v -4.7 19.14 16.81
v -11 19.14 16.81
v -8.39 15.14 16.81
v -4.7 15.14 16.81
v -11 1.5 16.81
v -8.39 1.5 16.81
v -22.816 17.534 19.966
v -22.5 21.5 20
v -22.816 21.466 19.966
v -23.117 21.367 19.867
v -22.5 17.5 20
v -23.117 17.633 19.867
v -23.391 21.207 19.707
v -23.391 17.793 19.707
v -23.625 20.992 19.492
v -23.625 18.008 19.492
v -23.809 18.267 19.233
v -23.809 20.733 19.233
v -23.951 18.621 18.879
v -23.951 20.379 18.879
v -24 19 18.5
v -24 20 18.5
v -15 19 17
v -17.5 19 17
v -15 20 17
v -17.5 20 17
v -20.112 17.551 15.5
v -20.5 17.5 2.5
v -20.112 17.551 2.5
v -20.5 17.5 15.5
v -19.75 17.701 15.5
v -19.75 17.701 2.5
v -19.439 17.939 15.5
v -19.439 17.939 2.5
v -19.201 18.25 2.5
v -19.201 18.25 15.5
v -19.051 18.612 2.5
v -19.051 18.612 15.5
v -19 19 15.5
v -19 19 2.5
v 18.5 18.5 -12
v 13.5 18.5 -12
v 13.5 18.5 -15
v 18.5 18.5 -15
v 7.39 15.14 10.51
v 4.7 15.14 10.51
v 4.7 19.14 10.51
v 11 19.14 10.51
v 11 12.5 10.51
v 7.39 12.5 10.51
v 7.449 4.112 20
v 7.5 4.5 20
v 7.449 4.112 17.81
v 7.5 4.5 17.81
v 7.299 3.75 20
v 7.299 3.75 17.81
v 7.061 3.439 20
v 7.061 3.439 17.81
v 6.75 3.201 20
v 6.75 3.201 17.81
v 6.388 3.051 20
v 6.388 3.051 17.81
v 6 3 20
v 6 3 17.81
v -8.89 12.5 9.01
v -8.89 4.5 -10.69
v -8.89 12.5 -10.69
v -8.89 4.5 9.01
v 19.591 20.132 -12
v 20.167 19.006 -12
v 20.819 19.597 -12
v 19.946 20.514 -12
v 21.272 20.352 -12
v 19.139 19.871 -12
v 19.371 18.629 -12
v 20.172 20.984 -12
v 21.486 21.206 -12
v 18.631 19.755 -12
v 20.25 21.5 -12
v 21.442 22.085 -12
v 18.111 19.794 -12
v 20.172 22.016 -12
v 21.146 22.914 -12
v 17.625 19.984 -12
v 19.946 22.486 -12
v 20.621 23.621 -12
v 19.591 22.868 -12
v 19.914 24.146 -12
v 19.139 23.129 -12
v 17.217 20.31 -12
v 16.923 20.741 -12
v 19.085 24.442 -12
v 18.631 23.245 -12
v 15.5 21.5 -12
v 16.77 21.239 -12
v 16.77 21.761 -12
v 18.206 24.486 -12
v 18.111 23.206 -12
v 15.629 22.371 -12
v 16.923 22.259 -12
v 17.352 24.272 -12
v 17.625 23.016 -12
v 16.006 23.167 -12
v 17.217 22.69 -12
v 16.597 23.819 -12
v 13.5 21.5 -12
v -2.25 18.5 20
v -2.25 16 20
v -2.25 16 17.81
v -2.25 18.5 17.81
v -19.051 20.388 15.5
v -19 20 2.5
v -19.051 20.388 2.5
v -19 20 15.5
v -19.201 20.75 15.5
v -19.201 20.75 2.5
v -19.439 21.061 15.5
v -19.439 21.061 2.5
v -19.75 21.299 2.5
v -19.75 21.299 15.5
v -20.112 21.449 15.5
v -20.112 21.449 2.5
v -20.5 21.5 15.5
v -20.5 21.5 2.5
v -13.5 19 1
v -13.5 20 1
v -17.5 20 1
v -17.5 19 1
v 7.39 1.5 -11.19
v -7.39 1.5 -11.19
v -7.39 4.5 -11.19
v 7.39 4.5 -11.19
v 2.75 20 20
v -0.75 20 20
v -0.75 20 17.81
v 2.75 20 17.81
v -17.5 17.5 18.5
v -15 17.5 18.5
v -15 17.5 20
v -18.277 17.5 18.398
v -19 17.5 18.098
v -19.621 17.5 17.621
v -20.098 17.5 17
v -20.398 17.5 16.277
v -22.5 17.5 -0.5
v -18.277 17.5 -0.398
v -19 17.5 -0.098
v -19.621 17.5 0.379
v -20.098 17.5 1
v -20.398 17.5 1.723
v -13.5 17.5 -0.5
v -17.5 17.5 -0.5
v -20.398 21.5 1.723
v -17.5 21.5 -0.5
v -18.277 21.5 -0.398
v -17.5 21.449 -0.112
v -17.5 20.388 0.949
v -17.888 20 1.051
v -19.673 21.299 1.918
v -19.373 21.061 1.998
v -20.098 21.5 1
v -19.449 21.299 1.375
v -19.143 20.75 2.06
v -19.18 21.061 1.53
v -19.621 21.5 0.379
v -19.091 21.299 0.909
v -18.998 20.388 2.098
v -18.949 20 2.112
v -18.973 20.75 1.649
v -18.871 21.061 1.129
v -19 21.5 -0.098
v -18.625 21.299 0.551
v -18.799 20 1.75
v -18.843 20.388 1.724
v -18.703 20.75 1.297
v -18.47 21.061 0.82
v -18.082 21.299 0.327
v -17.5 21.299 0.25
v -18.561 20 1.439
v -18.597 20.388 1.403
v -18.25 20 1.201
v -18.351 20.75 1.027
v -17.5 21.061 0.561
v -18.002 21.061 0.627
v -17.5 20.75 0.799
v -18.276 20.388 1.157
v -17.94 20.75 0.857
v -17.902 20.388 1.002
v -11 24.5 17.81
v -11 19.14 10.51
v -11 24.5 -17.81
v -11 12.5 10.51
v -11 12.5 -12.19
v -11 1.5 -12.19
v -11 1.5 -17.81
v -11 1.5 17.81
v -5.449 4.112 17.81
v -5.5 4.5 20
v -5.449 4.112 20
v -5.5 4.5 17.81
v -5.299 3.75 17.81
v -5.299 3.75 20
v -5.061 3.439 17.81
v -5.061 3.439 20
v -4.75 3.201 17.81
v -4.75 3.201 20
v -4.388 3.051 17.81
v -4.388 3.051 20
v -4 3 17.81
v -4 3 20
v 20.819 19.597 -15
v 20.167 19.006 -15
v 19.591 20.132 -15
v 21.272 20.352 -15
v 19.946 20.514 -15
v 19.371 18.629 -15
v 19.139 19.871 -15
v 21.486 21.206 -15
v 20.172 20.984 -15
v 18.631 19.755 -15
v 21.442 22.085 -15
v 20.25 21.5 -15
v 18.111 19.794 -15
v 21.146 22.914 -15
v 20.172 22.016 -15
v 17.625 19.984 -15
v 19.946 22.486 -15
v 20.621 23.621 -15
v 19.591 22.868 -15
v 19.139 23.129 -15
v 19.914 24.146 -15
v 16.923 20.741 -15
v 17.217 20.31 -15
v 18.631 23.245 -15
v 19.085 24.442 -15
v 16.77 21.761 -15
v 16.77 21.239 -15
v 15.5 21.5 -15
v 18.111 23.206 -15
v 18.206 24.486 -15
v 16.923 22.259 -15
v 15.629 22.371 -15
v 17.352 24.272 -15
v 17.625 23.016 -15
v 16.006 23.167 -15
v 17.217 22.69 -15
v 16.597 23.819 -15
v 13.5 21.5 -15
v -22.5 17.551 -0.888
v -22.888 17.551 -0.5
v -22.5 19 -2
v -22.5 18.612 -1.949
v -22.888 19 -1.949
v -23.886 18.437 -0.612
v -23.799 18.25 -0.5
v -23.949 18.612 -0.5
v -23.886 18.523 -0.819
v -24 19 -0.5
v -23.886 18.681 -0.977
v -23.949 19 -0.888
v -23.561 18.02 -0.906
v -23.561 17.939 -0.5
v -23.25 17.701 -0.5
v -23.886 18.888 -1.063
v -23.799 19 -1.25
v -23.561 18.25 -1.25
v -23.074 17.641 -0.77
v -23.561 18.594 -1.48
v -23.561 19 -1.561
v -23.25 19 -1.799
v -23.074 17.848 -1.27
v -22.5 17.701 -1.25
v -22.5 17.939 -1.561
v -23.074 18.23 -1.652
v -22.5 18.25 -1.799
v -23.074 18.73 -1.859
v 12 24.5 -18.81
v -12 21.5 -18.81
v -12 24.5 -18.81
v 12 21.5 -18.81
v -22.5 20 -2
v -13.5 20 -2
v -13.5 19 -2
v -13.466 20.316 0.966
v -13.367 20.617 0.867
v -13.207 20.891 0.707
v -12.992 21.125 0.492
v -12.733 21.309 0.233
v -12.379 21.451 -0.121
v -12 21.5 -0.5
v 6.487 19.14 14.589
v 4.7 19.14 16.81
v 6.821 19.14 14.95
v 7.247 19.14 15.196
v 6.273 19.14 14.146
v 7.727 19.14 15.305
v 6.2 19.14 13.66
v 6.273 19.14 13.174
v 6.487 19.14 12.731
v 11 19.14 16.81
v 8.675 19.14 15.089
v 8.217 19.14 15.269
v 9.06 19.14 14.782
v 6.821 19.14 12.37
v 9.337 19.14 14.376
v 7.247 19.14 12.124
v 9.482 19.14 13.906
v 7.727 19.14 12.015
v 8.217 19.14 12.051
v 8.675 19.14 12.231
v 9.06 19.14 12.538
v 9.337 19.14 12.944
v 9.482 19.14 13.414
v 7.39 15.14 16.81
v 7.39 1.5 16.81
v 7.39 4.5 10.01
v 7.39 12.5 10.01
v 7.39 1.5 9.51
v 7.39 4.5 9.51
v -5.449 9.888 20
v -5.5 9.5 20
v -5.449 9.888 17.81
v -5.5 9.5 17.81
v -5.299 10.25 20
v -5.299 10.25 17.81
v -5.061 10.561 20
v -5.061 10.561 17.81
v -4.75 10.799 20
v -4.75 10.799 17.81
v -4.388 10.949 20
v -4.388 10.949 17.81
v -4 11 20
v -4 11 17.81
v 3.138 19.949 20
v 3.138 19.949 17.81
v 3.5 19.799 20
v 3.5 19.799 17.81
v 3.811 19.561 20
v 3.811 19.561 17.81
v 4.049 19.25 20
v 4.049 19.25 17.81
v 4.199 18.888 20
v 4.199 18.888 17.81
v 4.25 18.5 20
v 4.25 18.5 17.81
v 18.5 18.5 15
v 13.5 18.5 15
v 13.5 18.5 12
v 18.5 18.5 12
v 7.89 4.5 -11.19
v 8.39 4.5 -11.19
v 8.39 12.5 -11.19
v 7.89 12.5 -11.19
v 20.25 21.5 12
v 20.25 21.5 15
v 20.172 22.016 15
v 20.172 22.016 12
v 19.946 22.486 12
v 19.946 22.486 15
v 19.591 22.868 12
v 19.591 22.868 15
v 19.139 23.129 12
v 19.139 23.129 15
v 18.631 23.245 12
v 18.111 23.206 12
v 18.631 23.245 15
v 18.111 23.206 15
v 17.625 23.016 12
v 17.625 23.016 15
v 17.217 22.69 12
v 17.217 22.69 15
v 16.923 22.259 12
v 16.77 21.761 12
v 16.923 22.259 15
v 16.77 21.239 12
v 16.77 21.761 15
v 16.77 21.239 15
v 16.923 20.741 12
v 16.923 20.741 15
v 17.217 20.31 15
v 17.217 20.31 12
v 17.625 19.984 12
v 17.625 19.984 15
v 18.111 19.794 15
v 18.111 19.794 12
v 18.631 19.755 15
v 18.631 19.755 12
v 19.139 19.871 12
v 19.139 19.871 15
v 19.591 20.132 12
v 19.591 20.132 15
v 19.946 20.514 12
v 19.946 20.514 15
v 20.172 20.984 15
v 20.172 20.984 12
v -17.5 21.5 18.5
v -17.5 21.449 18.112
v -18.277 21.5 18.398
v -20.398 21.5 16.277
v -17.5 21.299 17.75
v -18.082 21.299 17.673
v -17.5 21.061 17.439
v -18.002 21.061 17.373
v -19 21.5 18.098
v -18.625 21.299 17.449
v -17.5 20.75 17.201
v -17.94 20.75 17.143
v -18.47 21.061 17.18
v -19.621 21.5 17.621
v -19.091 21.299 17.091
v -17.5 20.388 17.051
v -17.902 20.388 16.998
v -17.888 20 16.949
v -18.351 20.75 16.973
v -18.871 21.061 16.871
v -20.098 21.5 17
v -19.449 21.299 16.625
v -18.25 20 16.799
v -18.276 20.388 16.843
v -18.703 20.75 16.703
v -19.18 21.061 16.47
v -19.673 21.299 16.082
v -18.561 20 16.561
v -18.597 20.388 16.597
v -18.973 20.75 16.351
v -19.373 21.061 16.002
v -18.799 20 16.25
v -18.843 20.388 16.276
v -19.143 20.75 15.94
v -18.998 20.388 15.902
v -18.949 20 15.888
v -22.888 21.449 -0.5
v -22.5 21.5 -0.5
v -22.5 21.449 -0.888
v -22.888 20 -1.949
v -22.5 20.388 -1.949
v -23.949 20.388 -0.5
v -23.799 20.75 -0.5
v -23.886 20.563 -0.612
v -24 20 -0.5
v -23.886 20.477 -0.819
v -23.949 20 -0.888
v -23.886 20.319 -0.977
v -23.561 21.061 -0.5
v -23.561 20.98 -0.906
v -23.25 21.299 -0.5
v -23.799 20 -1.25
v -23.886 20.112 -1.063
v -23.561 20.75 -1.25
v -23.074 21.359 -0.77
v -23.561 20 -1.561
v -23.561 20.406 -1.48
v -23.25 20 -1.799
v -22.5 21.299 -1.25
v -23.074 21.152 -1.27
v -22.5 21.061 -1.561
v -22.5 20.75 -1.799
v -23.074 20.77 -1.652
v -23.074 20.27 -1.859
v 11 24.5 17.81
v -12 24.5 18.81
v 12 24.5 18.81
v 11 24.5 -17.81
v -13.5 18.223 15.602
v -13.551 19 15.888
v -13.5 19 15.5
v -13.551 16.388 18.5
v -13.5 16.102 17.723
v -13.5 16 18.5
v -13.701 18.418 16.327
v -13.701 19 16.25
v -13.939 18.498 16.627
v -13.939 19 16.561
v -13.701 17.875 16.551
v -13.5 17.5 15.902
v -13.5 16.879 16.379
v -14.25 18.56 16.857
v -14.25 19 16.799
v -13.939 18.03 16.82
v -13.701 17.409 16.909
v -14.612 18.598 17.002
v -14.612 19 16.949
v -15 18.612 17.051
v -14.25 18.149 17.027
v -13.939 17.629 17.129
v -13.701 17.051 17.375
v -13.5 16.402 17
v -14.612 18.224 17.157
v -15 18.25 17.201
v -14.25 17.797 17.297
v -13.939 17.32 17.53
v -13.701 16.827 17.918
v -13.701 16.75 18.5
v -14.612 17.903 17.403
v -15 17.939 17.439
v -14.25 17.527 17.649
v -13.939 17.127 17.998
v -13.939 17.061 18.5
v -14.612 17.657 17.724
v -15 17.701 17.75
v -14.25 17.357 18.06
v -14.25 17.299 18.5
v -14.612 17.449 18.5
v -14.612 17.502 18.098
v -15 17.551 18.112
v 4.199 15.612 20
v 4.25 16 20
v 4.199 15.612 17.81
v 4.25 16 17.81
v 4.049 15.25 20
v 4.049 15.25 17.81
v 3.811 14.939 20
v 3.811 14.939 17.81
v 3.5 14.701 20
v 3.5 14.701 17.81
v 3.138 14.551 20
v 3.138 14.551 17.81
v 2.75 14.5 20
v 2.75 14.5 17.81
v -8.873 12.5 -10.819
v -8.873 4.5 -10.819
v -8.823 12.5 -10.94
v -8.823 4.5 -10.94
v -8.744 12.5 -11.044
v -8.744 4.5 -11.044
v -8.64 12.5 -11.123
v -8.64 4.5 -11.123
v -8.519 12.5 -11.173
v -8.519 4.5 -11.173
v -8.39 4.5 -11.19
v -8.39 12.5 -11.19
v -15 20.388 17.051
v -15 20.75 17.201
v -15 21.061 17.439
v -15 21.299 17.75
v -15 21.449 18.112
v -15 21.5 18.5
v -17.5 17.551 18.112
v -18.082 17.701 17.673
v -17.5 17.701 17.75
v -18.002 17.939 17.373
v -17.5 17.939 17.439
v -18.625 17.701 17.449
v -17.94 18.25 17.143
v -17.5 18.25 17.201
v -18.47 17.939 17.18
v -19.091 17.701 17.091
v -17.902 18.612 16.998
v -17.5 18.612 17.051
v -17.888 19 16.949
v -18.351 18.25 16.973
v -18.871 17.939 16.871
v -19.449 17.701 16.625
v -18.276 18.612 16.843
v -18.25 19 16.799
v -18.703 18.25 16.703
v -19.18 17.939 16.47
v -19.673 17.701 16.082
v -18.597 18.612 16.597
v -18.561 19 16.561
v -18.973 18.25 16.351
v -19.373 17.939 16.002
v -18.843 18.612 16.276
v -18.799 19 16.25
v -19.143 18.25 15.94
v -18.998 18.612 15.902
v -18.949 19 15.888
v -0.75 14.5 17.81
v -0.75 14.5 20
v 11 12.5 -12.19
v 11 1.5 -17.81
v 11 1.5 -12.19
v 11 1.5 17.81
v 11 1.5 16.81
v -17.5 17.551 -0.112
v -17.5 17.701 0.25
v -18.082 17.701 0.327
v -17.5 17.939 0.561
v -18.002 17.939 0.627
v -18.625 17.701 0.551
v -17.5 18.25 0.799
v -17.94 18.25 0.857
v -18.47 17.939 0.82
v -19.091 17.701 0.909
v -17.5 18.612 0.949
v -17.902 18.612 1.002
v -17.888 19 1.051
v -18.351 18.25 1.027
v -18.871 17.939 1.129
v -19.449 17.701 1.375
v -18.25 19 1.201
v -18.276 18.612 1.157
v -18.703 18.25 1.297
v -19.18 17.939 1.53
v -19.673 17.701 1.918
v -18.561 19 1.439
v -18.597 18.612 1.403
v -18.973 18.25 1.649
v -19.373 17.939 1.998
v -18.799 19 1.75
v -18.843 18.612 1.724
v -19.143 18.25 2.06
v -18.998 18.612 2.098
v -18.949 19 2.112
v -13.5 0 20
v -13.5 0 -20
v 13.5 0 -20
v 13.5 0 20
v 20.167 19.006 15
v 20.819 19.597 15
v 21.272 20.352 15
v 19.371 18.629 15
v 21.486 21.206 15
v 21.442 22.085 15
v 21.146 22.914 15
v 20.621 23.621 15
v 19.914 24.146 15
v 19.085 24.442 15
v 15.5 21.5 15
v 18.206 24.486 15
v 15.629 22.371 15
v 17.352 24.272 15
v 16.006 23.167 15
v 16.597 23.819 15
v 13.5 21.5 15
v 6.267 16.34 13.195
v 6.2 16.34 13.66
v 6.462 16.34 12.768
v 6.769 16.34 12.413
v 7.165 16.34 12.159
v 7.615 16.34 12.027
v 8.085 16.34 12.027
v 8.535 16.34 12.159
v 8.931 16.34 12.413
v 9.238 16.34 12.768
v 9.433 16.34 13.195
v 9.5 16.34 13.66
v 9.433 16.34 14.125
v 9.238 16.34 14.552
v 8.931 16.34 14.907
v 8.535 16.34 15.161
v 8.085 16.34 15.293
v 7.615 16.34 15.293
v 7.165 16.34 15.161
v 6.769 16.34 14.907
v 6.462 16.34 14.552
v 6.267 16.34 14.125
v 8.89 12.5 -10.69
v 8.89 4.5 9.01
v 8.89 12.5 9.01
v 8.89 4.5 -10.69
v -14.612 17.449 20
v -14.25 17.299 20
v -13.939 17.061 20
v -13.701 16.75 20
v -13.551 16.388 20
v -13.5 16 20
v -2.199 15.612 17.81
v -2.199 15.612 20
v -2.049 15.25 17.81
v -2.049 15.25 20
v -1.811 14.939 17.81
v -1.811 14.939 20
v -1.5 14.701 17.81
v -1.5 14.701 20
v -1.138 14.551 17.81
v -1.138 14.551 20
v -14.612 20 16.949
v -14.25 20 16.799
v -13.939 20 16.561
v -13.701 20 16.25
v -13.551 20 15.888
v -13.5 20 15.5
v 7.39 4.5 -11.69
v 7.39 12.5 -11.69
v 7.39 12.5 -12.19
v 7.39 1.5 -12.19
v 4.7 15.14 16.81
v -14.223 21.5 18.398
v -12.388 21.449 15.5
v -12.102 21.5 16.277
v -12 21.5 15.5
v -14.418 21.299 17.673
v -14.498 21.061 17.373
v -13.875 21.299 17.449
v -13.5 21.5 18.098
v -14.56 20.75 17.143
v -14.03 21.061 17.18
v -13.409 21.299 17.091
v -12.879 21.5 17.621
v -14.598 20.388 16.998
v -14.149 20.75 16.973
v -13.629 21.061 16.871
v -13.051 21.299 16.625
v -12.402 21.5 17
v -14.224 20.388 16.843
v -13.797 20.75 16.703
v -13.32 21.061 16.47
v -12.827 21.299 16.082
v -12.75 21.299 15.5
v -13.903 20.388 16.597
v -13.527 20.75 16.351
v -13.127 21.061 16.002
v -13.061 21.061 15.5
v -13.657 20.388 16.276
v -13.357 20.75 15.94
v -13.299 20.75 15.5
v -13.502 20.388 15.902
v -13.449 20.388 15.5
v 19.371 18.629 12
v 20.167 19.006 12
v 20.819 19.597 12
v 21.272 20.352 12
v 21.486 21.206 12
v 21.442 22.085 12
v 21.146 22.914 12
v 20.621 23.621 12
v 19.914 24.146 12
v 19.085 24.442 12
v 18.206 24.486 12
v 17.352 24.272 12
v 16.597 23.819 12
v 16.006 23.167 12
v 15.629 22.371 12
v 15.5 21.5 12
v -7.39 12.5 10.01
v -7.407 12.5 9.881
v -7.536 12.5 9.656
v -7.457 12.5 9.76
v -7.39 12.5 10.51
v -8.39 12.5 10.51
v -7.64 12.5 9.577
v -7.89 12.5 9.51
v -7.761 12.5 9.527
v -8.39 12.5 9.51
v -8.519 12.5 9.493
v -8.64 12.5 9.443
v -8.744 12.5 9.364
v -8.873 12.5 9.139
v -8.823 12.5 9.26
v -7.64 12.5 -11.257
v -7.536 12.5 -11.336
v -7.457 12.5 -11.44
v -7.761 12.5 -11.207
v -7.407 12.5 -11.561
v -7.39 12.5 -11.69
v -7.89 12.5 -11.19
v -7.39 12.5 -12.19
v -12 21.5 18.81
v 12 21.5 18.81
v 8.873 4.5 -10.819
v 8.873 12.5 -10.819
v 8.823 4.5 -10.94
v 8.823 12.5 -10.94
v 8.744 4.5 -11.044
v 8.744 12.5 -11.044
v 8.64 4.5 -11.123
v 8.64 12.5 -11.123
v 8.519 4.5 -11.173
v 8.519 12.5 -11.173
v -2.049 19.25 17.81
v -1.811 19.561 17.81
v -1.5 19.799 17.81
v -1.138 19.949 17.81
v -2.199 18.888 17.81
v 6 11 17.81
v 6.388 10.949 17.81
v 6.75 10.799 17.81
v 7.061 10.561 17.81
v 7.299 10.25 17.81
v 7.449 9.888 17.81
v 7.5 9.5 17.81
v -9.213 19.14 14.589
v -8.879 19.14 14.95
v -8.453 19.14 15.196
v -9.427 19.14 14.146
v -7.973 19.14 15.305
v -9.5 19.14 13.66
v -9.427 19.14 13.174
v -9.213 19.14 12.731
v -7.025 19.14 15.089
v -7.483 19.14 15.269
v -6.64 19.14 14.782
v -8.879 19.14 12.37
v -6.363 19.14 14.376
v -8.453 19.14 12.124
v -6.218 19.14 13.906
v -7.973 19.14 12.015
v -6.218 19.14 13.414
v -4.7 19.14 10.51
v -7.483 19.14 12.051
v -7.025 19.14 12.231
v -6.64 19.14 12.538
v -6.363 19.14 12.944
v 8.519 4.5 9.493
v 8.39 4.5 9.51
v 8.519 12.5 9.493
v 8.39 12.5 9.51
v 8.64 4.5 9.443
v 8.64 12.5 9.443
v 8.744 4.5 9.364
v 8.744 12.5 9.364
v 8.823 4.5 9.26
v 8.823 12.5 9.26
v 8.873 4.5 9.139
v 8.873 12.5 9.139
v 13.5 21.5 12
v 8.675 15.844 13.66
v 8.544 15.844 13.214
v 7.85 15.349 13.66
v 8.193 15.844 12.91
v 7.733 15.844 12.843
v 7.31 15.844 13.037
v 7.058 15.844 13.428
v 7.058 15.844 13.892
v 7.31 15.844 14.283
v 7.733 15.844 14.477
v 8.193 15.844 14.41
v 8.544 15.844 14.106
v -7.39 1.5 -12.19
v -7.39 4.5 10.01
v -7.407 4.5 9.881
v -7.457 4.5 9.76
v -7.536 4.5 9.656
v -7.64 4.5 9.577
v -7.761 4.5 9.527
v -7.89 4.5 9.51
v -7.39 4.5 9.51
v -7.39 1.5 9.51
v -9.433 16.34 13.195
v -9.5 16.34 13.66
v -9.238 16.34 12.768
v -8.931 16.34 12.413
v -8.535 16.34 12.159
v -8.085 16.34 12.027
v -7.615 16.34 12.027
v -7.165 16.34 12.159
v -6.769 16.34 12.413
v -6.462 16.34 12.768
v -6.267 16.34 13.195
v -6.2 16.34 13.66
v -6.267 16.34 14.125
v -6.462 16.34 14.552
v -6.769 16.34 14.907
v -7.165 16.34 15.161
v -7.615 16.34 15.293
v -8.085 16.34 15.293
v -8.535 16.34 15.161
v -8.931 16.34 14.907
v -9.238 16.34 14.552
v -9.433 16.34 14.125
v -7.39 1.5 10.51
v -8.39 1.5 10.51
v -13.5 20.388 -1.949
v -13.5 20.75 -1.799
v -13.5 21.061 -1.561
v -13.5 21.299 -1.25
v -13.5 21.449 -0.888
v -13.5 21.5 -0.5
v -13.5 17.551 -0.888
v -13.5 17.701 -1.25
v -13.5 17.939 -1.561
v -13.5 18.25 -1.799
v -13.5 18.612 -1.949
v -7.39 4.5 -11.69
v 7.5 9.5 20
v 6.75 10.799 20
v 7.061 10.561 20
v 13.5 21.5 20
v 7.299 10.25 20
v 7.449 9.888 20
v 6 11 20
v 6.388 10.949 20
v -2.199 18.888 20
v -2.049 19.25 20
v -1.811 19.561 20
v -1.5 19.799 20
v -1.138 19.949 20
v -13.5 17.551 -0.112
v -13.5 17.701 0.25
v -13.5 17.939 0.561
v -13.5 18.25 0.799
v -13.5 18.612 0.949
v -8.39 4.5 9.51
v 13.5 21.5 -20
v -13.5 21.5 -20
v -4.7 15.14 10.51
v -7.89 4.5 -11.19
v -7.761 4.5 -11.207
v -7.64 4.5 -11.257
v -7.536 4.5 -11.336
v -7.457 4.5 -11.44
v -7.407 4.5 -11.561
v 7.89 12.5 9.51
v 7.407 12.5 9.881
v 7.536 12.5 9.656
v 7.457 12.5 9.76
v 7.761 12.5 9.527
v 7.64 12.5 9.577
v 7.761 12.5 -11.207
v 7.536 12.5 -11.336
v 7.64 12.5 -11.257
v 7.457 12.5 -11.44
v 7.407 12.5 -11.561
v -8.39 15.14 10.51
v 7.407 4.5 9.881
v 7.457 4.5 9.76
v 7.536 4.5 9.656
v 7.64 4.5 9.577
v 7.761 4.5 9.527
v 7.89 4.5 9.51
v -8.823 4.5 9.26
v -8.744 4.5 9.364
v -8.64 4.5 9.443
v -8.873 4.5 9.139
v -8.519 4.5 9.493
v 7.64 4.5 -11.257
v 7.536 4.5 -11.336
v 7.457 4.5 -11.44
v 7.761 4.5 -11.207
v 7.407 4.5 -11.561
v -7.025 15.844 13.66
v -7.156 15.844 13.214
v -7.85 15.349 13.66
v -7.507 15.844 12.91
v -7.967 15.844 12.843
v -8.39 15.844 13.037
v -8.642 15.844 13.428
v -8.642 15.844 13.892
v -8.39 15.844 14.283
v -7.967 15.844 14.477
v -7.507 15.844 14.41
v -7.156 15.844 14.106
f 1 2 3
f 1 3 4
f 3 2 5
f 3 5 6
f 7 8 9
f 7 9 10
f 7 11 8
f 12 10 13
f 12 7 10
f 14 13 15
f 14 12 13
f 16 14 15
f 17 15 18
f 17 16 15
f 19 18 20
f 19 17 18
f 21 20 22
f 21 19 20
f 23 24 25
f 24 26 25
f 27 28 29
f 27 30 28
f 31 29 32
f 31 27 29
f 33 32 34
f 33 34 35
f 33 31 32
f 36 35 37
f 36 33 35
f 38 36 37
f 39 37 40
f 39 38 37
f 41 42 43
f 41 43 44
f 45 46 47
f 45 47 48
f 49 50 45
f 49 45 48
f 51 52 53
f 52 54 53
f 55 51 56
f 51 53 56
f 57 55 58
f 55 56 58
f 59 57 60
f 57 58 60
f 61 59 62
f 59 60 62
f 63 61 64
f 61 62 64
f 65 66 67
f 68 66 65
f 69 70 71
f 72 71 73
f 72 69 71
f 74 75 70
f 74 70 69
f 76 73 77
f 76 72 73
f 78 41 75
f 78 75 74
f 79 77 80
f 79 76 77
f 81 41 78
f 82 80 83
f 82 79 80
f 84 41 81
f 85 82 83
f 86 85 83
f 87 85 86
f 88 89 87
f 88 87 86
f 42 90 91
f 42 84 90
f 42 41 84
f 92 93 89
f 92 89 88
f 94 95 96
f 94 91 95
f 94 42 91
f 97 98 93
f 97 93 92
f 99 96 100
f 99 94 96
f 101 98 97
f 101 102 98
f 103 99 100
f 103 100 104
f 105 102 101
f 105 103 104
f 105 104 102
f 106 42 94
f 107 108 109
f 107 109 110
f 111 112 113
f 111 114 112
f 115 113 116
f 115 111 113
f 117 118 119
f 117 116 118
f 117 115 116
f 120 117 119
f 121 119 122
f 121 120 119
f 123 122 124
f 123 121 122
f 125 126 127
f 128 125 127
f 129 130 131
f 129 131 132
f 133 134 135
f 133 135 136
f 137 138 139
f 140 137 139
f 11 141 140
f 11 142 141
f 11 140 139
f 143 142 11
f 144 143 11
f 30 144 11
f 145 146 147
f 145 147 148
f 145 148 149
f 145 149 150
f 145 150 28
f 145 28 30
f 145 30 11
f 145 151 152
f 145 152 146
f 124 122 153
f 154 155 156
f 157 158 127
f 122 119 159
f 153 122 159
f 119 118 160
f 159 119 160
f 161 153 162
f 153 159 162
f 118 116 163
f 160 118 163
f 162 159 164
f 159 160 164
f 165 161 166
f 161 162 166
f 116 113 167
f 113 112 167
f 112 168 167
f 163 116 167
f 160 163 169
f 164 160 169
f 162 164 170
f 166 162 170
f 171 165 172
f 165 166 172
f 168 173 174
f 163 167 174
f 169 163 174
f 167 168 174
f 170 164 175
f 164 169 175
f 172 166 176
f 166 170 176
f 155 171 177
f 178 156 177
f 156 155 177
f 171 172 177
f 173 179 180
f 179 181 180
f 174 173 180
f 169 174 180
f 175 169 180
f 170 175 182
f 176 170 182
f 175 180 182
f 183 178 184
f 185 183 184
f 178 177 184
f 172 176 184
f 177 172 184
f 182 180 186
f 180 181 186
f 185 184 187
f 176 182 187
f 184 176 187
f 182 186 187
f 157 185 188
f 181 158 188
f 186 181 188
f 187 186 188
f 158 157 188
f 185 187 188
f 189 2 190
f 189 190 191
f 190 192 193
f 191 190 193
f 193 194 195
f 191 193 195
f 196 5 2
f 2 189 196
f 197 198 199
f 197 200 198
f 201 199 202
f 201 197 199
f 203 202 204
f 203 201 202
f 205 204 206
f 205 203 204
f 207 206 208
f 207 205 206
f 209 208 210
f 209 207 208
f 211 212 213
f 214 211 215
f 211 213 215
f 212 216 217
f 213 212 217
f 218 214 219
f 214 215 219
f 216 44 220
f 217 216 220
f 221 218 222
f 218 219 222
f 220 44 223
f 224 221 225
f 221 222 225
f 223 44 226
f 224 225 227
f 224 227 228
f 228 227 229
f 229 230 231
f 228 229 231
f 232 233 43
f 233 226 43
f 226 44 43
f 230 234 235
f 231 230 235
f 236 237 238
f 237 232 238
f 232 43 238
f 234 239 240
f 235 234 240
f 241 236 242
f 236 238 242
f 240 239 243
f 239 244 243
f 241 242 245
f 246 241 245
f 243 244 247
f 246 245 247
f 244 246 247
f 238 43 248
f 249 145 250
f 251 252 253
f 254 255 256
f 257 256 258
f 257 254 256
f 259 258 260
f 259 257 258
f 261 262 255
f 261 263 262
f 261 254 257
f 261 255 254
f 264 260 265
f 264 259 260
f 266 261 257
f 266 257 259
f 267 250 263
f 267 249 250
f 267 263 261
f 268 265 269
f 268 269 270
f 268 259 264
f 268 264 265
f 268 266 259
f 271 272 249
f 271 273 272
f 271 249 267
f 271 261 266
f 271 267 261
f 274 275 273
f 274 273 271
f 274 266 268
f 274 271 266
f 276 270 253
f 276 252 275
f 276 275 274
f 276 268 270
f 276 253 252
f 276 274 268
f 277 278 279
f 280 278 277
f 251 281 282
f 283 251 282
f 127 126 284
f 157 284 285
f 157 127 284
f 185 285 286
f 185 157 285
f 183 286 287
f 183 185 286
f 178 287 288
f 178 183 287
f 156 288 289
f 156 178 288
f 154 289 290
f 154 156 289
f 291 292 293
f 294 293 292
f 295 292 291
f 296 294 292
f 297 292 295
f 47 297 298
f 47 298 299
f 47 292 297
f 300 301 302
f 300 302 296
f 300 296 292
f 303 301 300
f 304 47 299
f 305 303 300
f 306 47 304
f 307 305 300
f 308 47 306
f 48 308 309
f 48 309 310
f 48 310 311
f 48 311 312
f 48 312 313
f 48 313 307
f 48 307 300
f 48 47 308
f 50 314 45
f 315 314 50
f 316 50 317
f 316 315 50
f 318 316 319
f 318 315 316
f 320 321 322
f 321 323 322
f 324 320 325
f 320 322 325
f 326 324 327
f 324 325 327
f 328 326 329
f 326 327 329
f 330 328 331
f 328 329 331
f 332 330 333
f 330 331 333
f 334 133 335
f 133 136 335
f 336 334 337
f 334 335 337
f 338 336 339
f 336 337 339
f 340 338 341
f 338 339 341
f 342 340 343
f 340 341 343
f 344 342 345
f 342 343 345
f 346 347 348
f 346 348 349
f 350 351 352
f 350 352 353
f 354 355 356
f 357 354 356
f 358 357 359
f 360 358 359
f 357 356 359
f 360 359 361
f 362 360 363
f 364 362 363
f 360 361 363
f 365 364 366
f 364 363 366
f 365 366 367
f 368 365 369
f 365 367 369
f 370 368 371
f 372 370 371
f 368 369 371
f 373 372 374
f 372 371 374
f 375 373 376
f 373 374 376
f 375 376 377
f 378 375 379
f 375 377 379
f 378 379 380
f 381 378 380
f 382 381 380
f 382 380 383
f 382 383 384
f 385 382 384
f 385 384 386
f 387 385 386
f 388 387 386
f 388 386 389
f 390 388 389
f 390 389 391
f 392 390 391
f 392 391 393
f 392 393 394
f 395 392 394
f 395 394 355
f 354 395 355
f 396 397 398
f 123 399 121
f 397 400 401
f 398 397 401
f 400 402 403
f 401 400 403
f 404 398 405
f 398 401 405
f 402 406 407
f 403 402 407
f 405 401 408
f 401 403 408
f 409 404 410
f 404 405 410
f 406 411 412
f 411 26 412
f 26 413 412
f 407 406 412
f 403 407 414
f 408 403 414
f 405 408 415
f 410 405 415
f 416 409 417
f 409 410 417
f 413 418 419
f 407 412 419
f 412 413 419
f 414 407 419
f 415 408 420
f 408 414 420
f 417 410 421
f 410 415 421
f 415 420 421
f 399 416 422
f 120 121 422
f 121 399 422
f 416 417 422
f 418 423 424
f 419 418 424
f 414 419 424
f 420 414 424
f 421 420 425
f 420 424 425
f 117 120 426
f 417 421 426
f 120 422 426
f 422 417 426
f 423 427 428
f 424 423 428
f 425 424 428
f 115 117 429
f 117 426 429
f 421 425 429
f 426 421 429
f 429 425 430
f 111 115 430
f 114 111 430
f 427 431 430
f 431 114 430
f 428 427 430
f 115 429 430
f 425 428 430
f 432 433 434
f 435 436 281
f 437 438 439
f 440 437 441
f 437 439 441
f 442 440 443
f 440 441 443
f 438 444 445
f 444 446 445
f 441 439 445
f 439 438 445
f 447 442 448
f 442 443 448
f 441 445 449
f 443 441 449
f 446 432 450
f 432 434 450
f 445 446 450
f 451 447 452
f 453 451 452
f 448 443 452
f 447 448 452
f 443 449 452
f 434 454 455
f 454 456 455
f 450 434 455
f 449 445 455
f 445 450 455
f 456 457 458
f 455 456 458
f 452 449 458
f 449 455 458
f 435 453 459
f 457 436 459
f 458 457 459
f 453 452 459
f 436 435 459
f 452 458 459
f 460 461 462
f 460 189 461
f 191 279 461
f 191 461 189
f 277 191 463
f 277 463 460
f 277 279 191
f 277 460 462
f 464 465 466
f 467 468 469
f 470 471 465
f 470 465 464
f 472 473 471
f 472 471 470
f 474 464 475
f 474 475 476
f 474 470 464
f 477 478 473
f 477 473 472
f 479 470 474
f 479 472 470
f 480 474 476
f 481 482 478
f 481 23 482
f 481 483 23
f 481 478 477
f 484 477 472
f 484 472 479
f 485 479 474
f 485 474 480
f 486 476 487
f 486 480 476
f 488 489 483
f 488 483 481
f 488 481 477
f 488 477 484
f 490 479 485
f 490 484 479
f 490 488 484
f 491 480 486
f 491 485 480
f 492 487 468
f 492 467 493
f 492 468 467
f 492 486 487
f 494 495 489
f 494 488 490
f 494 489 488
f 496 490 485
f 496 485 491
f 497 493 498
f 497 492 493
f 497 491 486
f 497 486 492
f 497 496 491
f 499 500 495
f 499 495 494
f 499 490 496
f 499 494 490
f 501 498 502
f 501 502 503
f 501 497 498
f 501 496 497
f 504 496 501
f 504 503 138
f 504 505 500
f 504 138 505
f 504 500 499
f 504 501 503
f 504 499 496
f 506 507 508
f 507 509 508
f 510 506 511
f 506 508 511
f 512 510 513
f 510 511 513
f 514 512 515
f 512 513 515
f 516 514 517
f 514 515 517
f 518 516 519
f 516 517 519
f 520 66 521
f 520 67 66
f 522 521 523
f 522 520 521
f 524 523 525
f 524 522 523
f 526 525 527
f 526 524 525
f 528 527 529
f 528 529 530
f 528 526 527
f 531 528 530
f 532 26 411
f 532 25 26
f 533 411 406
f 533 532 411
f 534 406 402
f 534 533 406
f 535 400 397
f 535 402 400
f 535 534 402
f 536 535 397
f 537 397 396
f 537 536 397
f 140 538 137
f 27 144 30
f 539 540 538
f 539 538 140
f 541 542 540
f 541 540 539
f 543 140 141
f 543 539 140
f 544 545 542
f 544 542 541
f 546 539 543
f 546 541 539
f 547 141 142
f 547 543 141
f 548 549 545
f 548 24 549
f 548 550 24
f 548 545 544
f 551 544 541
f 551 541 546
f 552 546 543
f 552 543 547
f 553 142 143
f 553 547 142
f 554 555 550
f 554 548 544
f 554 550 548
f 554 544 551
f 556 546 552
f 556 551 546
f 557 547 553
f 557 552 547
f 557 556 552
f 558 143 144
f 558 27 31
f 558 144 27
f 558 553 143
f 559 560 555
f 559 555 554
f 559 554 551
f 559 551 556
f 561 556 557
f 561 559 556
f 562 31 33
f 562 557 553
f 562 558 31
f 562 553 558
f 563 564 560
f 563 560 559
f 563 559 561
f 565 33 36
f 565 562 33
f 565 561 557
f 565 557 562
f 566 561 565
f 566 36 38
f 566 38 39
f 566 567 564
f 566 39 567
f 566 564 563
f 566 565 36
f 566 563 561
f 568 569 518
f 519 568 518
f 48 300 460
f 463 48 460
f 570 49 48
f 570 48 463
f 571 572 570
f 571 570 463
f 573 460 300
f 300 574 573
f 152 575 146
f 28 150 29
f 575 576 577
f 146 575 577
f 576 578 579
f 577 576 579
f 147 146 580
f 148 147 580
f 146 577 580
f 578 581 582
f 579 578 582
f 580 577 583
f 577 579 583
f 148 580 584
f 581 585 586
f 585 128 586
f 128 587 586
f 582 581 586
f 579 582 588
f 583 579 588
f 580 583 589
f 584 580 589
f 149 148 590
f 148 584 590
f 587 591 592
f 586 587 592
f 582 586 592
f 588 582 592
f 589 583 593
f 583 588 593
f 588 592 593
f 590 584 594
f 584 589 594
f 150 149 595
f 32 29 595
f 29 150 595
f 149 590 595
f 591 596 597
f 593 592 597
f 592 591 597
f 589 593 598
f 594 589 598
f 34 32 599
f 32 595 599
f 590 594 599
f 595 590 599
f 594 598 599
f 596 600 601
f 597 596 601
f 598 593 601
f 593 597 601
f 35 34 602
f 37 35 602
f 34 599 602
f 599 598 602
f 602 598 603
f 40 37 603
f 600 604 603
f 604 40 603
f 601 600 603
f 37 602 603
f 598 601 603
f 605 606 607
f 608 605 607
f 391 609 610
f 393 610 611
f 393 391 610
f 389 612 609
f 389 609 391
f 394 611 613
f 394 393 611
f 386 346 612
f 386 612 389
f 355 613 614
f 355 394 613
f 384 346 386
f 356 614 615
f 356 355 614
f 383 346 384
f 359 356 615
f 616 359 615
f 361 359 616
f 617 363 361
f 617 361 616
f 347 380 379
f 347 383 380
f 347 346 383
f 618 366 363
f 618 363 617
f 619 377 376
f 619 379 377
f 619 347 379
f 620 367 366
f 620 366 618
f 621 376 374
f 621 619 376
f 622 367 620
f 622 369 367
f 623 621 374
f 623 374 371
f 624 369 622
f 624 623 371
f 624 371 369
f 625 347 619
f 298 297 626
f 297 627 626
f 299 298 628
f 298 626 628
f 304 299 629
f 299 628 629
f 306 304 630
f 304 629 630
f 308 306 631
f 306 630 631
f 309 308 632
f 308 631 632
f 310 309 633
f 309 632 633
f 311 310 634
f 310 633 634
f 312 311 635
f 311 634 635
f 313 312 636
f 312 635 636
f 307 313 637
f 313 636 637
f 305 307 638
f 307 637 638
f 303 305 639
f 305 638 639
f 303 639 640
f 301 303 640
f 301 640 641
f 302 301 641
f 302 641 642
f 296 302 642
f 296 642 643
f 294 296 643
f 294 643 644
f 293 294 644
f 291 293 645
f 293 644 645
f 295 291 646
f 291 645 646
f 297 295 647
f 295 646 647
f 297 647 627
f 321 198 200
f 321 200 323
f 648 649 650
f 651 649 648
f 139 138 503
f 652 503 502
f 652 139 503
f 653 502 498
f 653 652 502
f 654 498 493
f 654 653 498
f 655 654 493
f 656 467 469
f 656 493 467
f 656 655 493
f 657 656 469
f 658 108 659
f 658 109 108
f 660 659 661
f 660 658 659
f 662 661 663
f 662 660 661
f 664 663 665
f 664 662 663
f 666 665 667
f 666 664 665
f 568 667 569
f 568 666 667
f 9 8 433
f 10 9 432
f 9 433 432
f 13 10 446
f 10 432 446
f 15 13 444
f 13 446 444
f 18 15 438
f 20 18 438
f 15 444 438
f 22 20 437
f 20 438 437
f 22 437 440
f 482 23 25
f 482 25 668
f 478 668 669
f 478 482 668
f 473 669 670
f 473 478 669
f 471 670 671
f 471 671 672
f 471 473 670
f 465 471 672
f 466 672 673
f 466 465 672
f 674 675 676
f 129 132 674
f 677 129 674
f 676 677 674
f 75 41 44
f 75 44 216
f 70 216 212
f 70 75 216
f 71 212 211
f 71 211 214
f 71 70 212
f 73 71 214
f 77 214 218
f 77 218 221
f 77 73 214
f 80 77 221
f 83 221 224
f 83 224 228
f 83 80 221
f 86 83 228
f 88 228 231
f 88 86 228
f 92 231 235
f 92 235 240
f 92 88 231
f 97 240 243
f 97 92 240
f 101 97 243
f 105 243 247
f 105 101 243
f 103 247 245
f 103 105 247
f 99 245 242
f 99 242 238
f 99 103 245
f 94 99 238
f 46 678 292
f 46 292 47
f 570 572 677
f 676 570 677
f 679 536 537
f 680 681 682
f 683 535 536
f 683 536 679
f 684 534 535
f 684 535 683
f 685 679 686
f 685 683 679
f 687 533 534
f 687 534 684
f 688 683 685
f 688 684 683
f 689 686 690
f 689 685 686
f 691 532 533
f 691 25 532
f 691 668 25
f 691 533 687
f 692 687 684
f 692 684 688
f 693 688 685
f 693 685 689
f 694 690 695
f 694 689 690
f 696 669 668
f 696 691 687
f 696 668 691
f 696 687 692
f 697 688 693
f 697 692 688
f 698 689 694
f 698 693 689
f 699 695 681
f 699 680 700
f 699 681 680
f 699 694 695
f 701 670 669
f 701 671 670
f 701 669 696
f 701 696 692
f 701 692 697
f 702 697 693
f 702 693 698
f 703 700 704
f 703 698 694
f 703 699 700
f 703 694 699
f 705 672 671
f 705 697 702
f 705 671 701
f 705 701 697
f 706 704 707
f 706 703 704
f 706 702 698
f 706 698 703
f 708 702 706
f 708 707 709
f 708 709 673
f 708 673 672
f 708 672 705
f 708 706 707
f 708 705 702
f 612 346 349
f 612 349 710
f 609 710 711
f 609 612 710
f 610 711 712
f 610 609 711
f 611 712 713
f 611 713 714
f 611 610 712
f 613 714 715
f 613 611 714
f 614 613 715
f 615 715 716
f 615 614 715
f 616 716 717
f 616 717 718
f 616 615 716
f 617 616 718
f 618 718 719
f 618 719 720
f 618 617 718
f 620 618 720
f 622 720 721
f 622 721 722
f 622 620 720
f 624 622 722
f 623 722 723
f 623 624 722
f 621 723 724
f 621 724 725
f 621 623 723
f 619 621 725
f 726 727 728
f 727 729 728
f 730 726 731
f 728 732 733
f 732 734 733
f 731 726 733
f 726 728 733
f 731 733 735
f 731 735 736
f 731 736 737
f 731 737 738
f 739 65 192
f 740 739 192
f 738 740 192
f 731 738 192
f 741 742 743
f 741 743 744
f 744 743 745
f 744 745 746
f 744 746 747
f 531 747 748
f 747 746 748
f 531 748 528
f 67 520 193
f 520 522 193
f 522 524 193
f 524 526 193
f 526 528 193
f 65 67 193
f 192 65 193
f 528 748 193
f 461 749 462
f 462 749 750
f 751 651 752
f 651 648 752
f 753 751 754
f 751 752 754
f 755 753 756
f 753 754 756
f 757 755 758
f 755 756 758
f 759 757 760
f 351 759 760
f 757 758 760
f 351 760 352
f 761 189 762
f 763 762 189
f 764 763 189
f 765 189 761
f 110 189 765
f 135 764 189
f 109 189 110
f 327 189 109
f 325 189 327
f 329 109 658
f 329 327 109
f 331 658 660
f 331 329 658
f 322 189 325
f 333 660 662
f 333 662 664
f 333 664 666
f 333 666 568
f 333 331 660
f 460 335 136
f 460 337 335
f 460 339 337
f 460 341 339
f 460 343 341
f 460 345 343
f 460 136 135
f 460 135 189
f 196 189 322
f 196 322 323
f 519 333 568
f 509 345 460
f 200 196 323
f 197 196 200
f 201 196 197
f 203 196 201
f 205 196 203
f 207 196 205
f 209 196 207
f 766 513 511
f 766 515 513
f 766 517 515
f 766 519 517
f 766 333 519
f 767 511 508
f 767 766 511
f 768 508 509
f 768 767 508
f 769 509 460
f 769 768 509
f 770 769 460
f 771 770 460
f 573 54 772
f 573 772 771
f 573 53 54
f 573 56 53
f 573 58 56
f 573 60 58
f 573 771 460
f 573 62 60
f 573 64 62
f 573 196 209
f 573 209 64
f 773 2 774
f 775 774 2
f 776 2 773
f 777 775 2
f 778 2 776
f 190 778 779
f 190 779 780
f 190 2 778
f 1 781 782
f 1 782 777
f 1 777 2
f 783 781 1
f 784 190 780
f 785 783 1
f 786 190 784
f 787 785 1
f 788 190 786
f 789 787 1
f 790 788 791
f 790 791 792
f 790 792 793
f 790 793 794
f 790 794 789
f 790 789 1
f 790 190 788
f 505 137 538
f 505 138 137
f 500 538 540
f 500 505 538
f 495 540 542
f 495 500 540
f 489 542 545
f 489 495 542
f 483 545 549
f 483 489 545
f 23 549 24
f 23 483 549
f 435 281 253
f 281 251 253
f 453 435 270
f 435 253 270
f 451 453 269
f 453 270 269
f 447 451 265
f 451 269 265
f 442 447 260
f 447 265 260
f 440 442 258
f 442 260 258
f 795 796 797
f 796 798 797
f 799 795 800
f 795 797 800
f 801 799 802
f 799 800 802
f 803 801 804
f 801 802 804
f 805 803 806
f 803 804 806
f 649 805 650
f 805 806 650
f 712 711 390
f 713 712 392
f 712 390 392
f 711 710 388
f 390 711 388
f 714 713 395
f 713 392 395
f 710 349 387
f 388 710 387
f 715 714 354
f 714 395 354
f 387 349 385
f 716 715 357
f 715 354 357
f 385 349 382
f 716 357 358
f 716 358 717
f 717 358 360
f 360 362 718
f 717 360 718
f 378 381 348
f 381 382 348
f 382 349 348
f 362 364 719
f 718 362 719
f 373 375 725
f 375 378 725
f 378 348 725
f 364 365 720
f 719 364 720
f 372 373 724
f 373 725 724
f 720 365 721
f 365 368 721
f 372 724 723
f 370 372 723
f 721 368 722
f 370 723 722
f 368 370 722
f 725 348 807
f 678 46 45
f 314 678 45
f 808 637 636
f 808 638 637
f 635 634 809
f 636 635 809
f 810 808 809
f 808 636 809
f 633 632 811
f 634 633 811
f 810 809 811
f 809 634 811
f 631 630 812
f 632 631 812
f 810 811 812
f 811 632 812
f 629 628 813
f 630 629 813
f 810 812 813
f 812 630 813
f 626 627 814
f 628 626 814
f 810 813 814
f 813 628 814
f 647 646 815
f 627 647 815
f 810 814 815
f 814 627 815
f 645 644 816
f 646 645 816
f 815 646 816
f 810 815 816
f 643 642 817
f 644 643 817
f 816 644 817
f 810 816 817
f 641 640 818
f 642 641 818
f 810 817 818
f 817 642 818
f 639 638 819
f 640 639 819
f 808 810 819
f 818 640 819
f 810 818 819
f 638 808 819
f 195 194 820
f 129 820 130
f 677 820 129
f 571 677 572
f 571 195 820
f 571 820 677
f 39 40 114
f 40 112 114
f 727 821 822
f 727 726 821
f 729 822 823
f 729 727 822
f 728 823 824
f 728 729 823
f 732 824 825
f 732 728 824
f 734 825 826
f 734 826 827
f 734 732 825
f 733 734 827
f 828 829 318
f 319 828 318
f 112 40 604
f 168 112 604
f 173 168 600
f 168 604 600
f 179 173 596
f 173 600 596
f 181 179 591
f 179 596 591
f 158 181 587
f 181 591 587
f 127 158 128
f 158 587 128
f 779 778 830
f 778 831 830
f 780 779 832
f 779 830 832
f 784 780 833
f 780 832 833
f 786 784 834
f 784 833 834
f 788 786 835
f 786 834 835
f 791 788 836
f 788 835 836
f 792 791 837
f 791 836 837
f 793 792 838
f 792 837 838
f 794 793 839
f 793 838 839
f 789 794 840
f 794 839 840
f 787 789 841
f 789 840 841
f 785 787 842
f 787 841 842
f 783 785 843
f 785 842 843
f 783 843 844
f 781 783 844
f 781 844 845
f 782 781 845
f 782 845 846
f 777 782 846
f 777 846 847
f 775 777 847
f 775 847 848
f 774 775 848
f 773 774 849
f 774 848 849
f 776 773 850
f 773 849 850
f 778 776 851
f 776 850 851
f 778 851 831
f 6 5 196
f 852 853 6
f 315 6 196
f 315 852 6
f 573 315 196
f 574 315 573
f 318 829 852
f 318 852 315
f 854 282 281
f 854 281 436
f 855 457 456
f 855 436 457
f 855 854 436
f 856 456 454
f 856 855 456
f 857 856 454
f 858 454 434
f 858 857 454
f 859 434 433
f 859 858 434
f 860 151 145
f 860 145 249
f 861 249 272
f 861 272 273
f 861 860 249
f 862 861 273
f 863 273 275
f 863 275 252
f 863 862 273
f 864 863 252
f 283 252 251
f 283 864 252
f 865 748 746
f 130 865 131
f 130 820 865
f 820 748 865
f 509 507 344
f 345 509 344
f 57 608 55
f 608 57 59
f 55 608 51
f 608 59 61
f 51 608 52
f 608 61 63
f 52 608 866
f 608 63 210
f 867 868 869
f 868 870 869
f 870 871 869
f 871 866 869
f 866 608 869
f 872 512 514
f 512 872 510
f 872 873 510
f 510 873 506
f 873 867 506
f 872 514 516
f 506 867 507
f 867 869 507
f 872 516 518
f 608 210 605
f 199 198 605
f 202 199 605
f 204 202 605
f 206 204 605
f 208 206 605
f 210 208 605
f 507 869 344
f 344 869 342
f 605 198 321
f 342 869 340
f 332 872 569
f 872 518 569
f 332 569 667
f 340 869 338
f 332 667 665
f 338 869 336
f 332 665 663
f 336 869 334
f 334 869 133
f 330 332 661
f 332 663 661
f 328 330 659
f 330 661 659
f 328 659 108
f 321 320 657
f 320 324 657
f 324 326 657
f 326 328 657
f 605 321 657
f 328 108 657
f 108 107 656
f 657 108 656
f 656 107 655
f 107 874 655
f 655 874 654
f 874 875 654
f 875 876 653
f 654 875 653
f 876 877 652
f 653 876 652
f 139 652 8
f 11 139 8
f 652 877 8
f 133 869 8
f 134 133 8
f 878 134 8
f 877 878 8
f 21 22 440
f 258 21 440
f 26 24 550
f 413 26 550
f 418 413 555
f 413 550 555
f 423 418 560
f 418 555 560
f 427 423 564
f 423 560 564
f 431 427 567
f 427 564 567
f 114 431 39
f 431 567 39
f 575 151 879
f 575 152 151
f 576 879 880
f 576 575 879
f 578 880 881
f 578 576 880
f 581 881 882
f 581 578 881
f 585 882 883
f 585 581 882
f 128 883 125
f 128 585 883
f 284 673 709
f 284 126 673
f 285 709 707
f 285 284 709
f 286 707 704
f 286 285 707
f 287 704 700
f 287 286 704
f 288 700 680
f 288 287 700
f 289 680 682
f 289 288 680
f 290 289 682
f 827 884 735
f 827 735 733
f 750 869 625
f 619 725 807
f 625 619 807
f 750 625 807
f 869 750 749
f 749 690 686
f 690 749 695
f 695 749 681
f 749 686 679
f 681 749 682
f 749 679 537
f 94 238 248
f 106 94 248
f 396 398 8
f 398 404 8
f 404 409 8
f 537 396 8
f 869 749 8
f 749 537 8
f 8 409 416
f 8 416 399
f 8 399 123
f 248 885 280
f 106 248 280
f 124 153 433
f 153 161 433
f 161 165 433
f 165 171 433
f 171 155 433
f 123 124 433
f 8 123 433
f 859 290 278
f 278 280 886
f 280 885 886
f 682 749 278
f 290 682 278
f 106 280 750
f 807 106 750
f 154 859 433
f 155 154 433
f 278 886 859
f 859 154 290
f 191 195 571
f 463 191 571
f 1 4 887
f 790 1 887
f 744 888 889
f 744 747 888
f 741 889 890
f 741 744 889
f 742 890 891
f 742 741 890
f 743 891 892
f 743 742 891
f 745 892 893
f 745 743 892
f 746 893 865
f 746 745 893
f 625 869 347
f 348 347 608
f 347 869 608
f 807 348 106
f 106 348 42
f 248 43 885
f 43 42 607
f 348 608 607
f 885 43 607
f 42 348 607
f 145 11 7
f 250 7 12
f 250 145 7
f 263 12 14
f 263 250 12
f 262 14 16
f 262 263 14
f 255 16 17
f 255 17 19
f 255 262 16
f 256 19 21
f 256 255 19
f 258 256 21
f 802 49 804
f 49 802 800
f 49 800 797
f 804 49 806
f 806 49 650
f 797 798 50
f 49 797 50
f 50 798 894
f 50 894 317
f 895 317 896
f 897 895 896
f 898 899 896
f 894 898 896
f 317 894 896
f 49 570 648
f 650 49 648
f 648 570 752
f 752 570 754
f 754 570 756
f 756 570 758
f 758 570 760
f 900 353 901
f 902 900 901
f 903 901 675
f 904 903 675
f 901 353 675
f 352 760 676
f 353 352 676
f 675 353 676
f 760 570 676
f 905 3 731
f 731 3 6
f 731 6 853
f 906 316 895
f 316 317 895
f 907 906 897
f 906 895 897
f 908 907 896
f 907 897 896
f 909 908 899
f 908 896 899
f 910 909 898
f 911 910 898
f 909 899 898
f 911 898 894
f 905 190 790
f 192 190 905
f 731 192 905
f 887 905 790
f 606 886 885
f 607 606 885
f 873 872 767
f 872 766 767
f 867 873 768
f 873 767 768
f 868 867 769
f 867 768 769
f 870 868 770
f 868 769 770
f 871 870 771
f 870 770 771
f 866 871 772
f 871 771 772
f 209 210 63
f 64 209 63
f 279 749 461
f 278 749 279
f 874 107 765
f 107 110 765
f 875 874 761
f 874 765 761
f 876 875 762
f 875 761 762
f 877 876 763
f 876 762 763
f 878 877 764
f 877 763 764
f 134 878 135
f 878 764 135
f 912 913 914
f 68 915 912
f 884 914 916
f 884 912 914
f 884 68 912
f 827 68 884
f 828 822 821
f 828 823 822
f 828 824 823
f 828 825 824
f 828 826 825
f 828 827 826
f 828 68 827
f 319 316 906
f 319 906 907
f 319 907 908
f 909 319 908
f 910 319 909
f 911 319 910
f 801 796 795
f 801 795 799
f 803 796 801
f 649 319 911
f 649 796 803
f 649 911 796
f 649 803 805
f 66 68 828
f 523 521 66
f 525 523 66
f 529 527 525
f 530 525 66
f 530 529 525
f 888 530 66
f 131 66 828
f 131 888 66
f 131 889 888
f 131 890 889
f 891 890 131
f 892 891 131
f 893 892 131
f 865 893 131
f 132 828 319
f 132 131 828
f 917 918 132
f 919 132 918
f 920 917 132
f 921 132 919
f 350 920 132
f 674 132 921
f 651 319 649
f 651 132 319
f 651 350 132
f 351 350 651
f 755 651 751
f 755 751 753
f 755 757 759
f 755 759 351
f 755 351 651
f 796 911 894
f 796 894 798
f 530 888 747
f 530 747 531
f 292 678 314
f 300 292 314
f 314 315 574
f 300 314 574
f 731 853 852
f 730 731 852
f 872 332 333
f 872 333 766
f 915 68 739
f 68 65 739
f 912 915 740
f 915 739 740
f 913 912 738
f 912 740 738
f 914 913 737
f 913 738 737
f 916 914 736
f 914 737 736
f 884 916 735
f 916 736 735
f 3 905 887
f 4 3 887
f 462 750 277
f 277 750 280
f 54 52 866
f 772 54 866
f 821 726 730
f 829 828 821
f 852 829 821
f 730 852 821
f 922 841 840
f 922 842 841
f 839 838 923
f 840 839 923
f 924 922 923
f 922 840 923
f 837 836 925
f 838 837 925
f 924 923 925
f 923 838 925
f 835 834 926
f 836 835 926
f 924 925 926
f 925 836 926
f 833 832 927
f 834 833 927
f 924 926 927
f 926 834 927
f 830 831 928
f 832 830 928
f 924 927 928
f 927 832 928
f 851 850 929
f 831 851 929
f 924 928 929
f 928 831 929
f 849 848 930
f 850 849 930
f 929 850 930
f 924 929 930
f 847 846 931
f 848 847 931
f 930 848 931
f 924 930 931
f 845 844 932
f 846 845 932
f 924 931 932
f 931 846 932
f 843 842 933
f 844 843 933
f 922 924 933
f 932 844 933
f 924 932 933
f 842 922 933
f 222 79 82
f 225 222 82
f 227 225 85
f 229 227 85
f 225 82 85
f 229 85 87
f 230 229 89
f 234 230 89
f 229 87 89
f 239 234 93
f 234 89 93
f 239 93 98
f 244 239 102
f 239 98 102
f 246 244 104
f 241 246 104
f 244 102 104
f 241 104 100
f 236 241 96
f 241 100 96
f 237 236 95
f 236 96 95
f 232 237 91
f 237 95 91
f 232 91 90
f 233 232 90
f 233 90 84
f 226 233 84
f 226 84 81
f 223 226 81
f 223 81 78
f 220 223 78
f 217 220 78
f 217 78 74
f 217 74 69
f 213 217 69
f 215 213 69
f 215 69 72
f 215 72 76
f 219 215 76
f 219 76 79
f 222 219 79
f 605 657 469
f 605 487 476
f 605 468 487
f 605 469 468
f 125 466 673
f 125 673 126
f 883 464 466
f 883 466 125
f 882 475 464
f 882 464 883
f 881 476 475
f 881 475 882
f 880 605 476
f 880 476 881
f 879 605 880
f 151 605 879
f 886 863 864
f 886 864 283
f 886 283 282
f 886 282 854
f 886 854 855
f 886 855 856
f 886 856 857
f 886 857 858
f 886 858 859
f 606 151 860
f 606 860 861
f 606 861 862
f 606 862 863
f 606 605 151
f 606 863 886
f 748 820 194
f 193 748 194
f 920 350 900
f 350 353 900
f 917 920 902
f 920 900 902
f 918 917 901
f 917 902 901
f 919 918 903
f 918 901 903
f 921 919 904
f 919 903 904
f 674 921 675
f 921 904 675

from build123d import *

# Parameters (mm, degrees)
SKETCH2_W                 = 27
SKETCH2_H                 = 40
BOSS_EXTRUDE1_DEPTH       = 1.5
SKETCH3_W                 = 27
SKETCH3_H                 = 40
SKETCH3_W_2               = 22
SKETCH3_H_2               = 35.62
BOSS_EXTRUDE2_DEPTH       = 20
SKETCH4_R                 = 1.75
BOSS_EXTRUDE3_DEPTH       = 40
BOSS_EXTRUDE4_DEPTH       = 11
SKETCH8_W                 = 17.78
SKETCH8_H                 = 20.7
BOSS_EXTRUDE5_DEPTH       = 3
FILLET1_R                 = 0.5
SKETCH9_W                 = 3.61
SKETCH9_H                 = 6.3
BOSS_EXTRUDE6_DEPTH       = 13.64
SKETCH10_W                = 6.3
SKETCH10_H                = 6.3
BOSS_EXTRUDE7_DEPTH       = 4
F_3_0MM_DOWEL_HOLE2_D     = 3.3
F_3_0MM_DOWEL_HOLE2_DEPTH = 2.8
F_3_0MM_DOWEL_HOLE2_TIP   = 0.991420021
CUT_EXTRUDE1_REACH        = 53.599
SKETCH13_W                = 13
SKETCH13_H                = 8
FILLET2_R                 = 1.5
CUT_EXTRUDE2_REACH        = 53.599
SKETCH14_W                = 6.5
SKETCH14_H                = 5.5
FILLET3_R                 = 1.5
SKETCH15_W                = 24
SKETCH15_H                = 37.62
SKETCH15_W_2              = 22
SKETCH15_H_2              = 35.62
BOSS_EXTRUDE8_DEPTH       = 3
BOSS_EXTRUDE9_DEPTH       = 4
FILLET4_R                 = 1.5
SKETCH17_W                = 5
SKETCH17_H                = 29.710811322
SKETCH17_H_2              = 26.502201667
SKETCH17_W_2              = 24
SKETCH17_H_3              = 26.060216056
CUT_EXTRUDE3_DEPTH        = 50.056090346


with BuildPart() as part:
    # Sketch2 → Boss-Extrude1 (new body)
    with BuildSketch(Plane(origin=(0, 0, 0), x_dir=(1, 0, 0), z_dir=(0, 1, 0))):
        Rectangle(SKETCH2_W, SKETCH2_H)
    extrude(amount=BOSS_EXTRUDE1_DEPTH)

    # Sketch3 → Boss-Extrude2 (add)
    with BuildSketch(Plane(origin=(0, 1.5, 0), x_dir=(1, 0, 0), z_dir=(0, 1, 0))):
        Rectangle(SKETCH3_W, SKETCH3_H)
        Rectangle(SKETCH3_W_2, SKETCH3_H_2, mode=Mode.SUBTRACT)
    extrude(amount=BOSS_EXTRUDE2_DEPTH)

    # Sketch4 → Boss-Extrude3 (add, through all)
    with BuildSketch(Plane.XY.offset(20)):
        with BuildLine():
            Line((15.5, 21.5), (13.5, 21.5))
            Line((13.5, 21.5), (13.5, 18.5))
            Line((13.5, 18.5), (18.5, 18.5))
            ThreePointArc((18.5, 18.5), (20.621320344, 23.621320344), (15.5, 21.5))
        make_face()
        with Locations((18.5, 21.5)):
            Circle(SKETCH4_R, mode=Mode.SUBTRACT)
    extrude(amount=-BOSS_EXTRUDE3_DEPTH)

    # Sketch6 → Boss-Extrude4 (add)
    with BuildSketch(Plane(origin=(0, 1.5, 0), x_dir=(1, 0, 0), z_dir=(0, 1, 0))):
        Polygon((8.89, -10.51), (7.39, -10.51), (7.39, -9.51), (8.89, -9.51), (8.89, 11.19), (7.39, 11.19), (7.39, 12.19), (8.89, 12.19), (11, 12.19), (11, -10.51), align=None)
        Polygon((-8.89, -10.51), (-11, -10.51), (-11, 12.19), (-8.89, 12.19), (-7.39, 12.19), (-7.39, 11.19), (-8.89, 11.19), (-8.89, -9.51), (-7.39, -9.51), (-7.39, -10.51), align=None)
    extrude(amount=BOSS_EXTRUDE4_DEPTH)

    # Sketch8 → Boss-Extrude5 (add)
    with BuildSketch(Plane(origin=(0, 1.5, 0), x_dir=(1, 0, 0), z_dir=(0, 1, 0))):
        with Locations((0, 0.84)):
            Rectangle(SKETCH8_W, SKETCH8_H)
    extrude(amount=BOSS_EXTRUDE5_DEPTH)

    # Fillet1
    fillet1_edges = [part.edges().sort_by_distance(p)[0] for p in [
        (7.39, 8.5, 9.51),
        (7.39, 8.5, -11.19),
        (8.89, 8.5, -11.19),
        (8.89, 8.5, 9.51),
        (-7.39, 8.5, 9.51),
        (-8.89, 8.5, 9.51),
        (-8.89, 8.5, -11.19),
        (-7.39, 8.5, -11.19),
    ]]
    fillet(fillet1_edges, radius=FILLET1_R)

    # Sketch9 → Boss-Extrude6 (add)
    with BuildSketch(Plane(origin=(0, 1.5, 0), x_dir=(1, 0, 0), z_dir=(0, 1, 0))):
        with Locations((-10.195, -13.66)):
            Rectangle(SKETCH9_W, SKETCH9_H)
        with Locations((9.195, -13.66)):
            Rectangle(SKETCH9_W, SKETCH9_H)
    extrude(amount=BOSS_EXTRUDE6_DEPTH)

    # Sketch10 → Boss-Extrude7 (add)
    with BuildSketch(Plane(origin=(0, 15.14, 0), x_dir=(1, 0, 0), z_dir=(0, 1, 0))):
        with Locations((-7.85, -13.66)):
            Rectangle(SKETCH10_W, SKETCH10_H)
        with Locations((7.85, -13.66)):
            Rectangle(SKETCH10_W, SKETCH10_H)
    extrude(amount=BOSS_EXTRUDE7_DEPTH)

    # Ø3.0mm Dowel Hole2
    with Locations(Plane(origin=(0, 19.14, 0), x_dir=(1, 0, 0), z_dir=(0, 1, 0))):
        with Locations((7.85, -13.66), (-7.85, -13.66)):
            Hole(F_3_0MM_DOWEL_HOLE2_D / 2, depth=F_3_0MM_DOWEL_HOLE2_DEPTH)
            with Locations((0, 0, -(F_3_0MM_DOWEL_HOLE2_DEPTH + F_3_0MM_DOWEL_HOLE2_TIP / 2))):  # 118° drill point
                Cone(0, F_3_0MM_DOWEL_HOLE2_D / 2, F_3_0MM_DOWEL_HOLE2_TIP, mode=Mode.SUBTRACT)

    # Sketch13 → Cut-Extrude1 (cut, up to next)
    with BuildSketch(Plane.XY.offset(20), mode=Mode.PRIVATE) as cut_extrude1_sk1:
        with Locations((1, 7)):
            Rectangle(SKETCH13_W, SKETCH13_H)
    cut_extrude1_tool1 = extrude(cut_extrude1_sk1.sketch, amount=-CUT_EXTRUDE1_REACH, mode=Mode.PRIVATE) & part.part
    add(cut_extrude1_tool1.solids().sort_by_distance((1, 7, 20))[0], mode=Mode.SUBTRACT)

    # Fillet2
    fillet2_edges = [part.edges().sort_by_distance(p)[0] for p in [
        (7.5, 3, 18.905),
        (7.5, 11, 18.905),
        (-5.5, 11, 18.905),
        (-5.5, 3, 18.905),
    ]]
    fillet(fillet2_edges, radius=FILLET2_R)

    # Sketch14 → Cut-Extrude2 (cut, up to next)
    with BuildSketch(Plane.XY.offset(20), mode=Mode.PRIVATE) as cut_extrude2_sk1:
        with Locations((1, 17.25)):
            Rectangle(SKETCH14_W, SKETCH14_H)
    cut_extrude2_tool1 = extrude(cut_extrude2_sk1.sketch, amount=-CUT_EXTRUDE2_REACH, mode=Mode.PRIVATE) & part.part
    add(cut_extrude2_tool1.solids().sort_by_distance((1, 17.25, 20))[0], mode=Mode.SUBTRACT)

    # Fillet3
    fillet3_edges = [part.edges().sort_by_distance(p)[0] for p in [
        (4.25, 14.5, 18.905),
        (4.25, 20, 18.905),
        (-2.25, 20, 18.905),
        (-2.25, 14.5, 18.905),
    ]]
    fillet(fillet3_edges, radius=FILLET3_R)

    # Sketch15 → Boss-Extrude8 (add)
    with BuildSketch(Plane(origin=(0, 21.5, 0), x_dir=(1, 0, 0), z_dir=(0, 1, 0))):
        Rectangle(SKETCH15_W, SKETCH15_H)
        Rectangle(SKETCH15_W_2, SKETCH15_H_2, mode=Mode.SUBTRACT)
    extrude(amount=BOSS_EXTRUDE8_DEPTH)

    # Sketch16 → Boss-Extrude9 (add)
    with BuildSketch(Plane(origin=(0, 21.5, 0), x_dir=(1, 0, 0), z_dir=(0, 1, 0))):
        Polygon((-13.5, -17), (-13.5, -20), (-24, -20), (-24, 2), (-13.5, 2), (-13.5, -1), (-19, -1), (-19, -17), align=None)
    extrude(amount=-BOSS_EXTRUDE9_DEPTH)

    # Fillet4
    fillet4_edges = [part.edges().sort_by_distance(p)[0] for p in [
        (-13.5, 17.5, 18.5),
        (-13.5, 21.5, 9),
        (-16.25, 17.5, 1),
        (-16.25, 17.5, 17),
        (-13.5, 19.5, 17),
        (-19, 17.5, 9),
        (-19, 19.5, 1),
        (-19, 19.5, 17),
        (-16.25, 21.5, 17),
        (-19, 21.5, 9),
        (-16.25, 21.5, 1),
        (-18.75, 17.5, -2),
        (-18.75, 21.5, -2),
        (-24, 19.5, 20),
        (-24, 21.5, 9),
        (-24, 17.5, 9),
        (-24, 19.5, -2),
    ]]
    fillet(fillet4_edges, radius=FILLET4_R - 0.0001)  # a hair under: the kernel refuses the full size

    # Sketch17 → Cut-Extrude3 (cut, through all)
    with BuildSketch(Plane(origin=(13.5, 0, 0), x_dir=(0, 0, -1), z_dir=(1, 0, 0))):
        with Locations((-17.5, 14.855405661)):
            Rectangle(SKETCH17_W, SKETCH17_H)
        with Locations((17.5, 13.251100834)):
            Rectangle(SKETCH17_W, SKETCH17_H_2)
        with Locations((0, 13.030108028)):
            Rectangle(SKETCH17_W_2, SKETCH17_H_3)
    extrude(amount=CUT_EXTRUDE3_DEPTH, mode=Mode.SUBTRACT)


solid = part.part
